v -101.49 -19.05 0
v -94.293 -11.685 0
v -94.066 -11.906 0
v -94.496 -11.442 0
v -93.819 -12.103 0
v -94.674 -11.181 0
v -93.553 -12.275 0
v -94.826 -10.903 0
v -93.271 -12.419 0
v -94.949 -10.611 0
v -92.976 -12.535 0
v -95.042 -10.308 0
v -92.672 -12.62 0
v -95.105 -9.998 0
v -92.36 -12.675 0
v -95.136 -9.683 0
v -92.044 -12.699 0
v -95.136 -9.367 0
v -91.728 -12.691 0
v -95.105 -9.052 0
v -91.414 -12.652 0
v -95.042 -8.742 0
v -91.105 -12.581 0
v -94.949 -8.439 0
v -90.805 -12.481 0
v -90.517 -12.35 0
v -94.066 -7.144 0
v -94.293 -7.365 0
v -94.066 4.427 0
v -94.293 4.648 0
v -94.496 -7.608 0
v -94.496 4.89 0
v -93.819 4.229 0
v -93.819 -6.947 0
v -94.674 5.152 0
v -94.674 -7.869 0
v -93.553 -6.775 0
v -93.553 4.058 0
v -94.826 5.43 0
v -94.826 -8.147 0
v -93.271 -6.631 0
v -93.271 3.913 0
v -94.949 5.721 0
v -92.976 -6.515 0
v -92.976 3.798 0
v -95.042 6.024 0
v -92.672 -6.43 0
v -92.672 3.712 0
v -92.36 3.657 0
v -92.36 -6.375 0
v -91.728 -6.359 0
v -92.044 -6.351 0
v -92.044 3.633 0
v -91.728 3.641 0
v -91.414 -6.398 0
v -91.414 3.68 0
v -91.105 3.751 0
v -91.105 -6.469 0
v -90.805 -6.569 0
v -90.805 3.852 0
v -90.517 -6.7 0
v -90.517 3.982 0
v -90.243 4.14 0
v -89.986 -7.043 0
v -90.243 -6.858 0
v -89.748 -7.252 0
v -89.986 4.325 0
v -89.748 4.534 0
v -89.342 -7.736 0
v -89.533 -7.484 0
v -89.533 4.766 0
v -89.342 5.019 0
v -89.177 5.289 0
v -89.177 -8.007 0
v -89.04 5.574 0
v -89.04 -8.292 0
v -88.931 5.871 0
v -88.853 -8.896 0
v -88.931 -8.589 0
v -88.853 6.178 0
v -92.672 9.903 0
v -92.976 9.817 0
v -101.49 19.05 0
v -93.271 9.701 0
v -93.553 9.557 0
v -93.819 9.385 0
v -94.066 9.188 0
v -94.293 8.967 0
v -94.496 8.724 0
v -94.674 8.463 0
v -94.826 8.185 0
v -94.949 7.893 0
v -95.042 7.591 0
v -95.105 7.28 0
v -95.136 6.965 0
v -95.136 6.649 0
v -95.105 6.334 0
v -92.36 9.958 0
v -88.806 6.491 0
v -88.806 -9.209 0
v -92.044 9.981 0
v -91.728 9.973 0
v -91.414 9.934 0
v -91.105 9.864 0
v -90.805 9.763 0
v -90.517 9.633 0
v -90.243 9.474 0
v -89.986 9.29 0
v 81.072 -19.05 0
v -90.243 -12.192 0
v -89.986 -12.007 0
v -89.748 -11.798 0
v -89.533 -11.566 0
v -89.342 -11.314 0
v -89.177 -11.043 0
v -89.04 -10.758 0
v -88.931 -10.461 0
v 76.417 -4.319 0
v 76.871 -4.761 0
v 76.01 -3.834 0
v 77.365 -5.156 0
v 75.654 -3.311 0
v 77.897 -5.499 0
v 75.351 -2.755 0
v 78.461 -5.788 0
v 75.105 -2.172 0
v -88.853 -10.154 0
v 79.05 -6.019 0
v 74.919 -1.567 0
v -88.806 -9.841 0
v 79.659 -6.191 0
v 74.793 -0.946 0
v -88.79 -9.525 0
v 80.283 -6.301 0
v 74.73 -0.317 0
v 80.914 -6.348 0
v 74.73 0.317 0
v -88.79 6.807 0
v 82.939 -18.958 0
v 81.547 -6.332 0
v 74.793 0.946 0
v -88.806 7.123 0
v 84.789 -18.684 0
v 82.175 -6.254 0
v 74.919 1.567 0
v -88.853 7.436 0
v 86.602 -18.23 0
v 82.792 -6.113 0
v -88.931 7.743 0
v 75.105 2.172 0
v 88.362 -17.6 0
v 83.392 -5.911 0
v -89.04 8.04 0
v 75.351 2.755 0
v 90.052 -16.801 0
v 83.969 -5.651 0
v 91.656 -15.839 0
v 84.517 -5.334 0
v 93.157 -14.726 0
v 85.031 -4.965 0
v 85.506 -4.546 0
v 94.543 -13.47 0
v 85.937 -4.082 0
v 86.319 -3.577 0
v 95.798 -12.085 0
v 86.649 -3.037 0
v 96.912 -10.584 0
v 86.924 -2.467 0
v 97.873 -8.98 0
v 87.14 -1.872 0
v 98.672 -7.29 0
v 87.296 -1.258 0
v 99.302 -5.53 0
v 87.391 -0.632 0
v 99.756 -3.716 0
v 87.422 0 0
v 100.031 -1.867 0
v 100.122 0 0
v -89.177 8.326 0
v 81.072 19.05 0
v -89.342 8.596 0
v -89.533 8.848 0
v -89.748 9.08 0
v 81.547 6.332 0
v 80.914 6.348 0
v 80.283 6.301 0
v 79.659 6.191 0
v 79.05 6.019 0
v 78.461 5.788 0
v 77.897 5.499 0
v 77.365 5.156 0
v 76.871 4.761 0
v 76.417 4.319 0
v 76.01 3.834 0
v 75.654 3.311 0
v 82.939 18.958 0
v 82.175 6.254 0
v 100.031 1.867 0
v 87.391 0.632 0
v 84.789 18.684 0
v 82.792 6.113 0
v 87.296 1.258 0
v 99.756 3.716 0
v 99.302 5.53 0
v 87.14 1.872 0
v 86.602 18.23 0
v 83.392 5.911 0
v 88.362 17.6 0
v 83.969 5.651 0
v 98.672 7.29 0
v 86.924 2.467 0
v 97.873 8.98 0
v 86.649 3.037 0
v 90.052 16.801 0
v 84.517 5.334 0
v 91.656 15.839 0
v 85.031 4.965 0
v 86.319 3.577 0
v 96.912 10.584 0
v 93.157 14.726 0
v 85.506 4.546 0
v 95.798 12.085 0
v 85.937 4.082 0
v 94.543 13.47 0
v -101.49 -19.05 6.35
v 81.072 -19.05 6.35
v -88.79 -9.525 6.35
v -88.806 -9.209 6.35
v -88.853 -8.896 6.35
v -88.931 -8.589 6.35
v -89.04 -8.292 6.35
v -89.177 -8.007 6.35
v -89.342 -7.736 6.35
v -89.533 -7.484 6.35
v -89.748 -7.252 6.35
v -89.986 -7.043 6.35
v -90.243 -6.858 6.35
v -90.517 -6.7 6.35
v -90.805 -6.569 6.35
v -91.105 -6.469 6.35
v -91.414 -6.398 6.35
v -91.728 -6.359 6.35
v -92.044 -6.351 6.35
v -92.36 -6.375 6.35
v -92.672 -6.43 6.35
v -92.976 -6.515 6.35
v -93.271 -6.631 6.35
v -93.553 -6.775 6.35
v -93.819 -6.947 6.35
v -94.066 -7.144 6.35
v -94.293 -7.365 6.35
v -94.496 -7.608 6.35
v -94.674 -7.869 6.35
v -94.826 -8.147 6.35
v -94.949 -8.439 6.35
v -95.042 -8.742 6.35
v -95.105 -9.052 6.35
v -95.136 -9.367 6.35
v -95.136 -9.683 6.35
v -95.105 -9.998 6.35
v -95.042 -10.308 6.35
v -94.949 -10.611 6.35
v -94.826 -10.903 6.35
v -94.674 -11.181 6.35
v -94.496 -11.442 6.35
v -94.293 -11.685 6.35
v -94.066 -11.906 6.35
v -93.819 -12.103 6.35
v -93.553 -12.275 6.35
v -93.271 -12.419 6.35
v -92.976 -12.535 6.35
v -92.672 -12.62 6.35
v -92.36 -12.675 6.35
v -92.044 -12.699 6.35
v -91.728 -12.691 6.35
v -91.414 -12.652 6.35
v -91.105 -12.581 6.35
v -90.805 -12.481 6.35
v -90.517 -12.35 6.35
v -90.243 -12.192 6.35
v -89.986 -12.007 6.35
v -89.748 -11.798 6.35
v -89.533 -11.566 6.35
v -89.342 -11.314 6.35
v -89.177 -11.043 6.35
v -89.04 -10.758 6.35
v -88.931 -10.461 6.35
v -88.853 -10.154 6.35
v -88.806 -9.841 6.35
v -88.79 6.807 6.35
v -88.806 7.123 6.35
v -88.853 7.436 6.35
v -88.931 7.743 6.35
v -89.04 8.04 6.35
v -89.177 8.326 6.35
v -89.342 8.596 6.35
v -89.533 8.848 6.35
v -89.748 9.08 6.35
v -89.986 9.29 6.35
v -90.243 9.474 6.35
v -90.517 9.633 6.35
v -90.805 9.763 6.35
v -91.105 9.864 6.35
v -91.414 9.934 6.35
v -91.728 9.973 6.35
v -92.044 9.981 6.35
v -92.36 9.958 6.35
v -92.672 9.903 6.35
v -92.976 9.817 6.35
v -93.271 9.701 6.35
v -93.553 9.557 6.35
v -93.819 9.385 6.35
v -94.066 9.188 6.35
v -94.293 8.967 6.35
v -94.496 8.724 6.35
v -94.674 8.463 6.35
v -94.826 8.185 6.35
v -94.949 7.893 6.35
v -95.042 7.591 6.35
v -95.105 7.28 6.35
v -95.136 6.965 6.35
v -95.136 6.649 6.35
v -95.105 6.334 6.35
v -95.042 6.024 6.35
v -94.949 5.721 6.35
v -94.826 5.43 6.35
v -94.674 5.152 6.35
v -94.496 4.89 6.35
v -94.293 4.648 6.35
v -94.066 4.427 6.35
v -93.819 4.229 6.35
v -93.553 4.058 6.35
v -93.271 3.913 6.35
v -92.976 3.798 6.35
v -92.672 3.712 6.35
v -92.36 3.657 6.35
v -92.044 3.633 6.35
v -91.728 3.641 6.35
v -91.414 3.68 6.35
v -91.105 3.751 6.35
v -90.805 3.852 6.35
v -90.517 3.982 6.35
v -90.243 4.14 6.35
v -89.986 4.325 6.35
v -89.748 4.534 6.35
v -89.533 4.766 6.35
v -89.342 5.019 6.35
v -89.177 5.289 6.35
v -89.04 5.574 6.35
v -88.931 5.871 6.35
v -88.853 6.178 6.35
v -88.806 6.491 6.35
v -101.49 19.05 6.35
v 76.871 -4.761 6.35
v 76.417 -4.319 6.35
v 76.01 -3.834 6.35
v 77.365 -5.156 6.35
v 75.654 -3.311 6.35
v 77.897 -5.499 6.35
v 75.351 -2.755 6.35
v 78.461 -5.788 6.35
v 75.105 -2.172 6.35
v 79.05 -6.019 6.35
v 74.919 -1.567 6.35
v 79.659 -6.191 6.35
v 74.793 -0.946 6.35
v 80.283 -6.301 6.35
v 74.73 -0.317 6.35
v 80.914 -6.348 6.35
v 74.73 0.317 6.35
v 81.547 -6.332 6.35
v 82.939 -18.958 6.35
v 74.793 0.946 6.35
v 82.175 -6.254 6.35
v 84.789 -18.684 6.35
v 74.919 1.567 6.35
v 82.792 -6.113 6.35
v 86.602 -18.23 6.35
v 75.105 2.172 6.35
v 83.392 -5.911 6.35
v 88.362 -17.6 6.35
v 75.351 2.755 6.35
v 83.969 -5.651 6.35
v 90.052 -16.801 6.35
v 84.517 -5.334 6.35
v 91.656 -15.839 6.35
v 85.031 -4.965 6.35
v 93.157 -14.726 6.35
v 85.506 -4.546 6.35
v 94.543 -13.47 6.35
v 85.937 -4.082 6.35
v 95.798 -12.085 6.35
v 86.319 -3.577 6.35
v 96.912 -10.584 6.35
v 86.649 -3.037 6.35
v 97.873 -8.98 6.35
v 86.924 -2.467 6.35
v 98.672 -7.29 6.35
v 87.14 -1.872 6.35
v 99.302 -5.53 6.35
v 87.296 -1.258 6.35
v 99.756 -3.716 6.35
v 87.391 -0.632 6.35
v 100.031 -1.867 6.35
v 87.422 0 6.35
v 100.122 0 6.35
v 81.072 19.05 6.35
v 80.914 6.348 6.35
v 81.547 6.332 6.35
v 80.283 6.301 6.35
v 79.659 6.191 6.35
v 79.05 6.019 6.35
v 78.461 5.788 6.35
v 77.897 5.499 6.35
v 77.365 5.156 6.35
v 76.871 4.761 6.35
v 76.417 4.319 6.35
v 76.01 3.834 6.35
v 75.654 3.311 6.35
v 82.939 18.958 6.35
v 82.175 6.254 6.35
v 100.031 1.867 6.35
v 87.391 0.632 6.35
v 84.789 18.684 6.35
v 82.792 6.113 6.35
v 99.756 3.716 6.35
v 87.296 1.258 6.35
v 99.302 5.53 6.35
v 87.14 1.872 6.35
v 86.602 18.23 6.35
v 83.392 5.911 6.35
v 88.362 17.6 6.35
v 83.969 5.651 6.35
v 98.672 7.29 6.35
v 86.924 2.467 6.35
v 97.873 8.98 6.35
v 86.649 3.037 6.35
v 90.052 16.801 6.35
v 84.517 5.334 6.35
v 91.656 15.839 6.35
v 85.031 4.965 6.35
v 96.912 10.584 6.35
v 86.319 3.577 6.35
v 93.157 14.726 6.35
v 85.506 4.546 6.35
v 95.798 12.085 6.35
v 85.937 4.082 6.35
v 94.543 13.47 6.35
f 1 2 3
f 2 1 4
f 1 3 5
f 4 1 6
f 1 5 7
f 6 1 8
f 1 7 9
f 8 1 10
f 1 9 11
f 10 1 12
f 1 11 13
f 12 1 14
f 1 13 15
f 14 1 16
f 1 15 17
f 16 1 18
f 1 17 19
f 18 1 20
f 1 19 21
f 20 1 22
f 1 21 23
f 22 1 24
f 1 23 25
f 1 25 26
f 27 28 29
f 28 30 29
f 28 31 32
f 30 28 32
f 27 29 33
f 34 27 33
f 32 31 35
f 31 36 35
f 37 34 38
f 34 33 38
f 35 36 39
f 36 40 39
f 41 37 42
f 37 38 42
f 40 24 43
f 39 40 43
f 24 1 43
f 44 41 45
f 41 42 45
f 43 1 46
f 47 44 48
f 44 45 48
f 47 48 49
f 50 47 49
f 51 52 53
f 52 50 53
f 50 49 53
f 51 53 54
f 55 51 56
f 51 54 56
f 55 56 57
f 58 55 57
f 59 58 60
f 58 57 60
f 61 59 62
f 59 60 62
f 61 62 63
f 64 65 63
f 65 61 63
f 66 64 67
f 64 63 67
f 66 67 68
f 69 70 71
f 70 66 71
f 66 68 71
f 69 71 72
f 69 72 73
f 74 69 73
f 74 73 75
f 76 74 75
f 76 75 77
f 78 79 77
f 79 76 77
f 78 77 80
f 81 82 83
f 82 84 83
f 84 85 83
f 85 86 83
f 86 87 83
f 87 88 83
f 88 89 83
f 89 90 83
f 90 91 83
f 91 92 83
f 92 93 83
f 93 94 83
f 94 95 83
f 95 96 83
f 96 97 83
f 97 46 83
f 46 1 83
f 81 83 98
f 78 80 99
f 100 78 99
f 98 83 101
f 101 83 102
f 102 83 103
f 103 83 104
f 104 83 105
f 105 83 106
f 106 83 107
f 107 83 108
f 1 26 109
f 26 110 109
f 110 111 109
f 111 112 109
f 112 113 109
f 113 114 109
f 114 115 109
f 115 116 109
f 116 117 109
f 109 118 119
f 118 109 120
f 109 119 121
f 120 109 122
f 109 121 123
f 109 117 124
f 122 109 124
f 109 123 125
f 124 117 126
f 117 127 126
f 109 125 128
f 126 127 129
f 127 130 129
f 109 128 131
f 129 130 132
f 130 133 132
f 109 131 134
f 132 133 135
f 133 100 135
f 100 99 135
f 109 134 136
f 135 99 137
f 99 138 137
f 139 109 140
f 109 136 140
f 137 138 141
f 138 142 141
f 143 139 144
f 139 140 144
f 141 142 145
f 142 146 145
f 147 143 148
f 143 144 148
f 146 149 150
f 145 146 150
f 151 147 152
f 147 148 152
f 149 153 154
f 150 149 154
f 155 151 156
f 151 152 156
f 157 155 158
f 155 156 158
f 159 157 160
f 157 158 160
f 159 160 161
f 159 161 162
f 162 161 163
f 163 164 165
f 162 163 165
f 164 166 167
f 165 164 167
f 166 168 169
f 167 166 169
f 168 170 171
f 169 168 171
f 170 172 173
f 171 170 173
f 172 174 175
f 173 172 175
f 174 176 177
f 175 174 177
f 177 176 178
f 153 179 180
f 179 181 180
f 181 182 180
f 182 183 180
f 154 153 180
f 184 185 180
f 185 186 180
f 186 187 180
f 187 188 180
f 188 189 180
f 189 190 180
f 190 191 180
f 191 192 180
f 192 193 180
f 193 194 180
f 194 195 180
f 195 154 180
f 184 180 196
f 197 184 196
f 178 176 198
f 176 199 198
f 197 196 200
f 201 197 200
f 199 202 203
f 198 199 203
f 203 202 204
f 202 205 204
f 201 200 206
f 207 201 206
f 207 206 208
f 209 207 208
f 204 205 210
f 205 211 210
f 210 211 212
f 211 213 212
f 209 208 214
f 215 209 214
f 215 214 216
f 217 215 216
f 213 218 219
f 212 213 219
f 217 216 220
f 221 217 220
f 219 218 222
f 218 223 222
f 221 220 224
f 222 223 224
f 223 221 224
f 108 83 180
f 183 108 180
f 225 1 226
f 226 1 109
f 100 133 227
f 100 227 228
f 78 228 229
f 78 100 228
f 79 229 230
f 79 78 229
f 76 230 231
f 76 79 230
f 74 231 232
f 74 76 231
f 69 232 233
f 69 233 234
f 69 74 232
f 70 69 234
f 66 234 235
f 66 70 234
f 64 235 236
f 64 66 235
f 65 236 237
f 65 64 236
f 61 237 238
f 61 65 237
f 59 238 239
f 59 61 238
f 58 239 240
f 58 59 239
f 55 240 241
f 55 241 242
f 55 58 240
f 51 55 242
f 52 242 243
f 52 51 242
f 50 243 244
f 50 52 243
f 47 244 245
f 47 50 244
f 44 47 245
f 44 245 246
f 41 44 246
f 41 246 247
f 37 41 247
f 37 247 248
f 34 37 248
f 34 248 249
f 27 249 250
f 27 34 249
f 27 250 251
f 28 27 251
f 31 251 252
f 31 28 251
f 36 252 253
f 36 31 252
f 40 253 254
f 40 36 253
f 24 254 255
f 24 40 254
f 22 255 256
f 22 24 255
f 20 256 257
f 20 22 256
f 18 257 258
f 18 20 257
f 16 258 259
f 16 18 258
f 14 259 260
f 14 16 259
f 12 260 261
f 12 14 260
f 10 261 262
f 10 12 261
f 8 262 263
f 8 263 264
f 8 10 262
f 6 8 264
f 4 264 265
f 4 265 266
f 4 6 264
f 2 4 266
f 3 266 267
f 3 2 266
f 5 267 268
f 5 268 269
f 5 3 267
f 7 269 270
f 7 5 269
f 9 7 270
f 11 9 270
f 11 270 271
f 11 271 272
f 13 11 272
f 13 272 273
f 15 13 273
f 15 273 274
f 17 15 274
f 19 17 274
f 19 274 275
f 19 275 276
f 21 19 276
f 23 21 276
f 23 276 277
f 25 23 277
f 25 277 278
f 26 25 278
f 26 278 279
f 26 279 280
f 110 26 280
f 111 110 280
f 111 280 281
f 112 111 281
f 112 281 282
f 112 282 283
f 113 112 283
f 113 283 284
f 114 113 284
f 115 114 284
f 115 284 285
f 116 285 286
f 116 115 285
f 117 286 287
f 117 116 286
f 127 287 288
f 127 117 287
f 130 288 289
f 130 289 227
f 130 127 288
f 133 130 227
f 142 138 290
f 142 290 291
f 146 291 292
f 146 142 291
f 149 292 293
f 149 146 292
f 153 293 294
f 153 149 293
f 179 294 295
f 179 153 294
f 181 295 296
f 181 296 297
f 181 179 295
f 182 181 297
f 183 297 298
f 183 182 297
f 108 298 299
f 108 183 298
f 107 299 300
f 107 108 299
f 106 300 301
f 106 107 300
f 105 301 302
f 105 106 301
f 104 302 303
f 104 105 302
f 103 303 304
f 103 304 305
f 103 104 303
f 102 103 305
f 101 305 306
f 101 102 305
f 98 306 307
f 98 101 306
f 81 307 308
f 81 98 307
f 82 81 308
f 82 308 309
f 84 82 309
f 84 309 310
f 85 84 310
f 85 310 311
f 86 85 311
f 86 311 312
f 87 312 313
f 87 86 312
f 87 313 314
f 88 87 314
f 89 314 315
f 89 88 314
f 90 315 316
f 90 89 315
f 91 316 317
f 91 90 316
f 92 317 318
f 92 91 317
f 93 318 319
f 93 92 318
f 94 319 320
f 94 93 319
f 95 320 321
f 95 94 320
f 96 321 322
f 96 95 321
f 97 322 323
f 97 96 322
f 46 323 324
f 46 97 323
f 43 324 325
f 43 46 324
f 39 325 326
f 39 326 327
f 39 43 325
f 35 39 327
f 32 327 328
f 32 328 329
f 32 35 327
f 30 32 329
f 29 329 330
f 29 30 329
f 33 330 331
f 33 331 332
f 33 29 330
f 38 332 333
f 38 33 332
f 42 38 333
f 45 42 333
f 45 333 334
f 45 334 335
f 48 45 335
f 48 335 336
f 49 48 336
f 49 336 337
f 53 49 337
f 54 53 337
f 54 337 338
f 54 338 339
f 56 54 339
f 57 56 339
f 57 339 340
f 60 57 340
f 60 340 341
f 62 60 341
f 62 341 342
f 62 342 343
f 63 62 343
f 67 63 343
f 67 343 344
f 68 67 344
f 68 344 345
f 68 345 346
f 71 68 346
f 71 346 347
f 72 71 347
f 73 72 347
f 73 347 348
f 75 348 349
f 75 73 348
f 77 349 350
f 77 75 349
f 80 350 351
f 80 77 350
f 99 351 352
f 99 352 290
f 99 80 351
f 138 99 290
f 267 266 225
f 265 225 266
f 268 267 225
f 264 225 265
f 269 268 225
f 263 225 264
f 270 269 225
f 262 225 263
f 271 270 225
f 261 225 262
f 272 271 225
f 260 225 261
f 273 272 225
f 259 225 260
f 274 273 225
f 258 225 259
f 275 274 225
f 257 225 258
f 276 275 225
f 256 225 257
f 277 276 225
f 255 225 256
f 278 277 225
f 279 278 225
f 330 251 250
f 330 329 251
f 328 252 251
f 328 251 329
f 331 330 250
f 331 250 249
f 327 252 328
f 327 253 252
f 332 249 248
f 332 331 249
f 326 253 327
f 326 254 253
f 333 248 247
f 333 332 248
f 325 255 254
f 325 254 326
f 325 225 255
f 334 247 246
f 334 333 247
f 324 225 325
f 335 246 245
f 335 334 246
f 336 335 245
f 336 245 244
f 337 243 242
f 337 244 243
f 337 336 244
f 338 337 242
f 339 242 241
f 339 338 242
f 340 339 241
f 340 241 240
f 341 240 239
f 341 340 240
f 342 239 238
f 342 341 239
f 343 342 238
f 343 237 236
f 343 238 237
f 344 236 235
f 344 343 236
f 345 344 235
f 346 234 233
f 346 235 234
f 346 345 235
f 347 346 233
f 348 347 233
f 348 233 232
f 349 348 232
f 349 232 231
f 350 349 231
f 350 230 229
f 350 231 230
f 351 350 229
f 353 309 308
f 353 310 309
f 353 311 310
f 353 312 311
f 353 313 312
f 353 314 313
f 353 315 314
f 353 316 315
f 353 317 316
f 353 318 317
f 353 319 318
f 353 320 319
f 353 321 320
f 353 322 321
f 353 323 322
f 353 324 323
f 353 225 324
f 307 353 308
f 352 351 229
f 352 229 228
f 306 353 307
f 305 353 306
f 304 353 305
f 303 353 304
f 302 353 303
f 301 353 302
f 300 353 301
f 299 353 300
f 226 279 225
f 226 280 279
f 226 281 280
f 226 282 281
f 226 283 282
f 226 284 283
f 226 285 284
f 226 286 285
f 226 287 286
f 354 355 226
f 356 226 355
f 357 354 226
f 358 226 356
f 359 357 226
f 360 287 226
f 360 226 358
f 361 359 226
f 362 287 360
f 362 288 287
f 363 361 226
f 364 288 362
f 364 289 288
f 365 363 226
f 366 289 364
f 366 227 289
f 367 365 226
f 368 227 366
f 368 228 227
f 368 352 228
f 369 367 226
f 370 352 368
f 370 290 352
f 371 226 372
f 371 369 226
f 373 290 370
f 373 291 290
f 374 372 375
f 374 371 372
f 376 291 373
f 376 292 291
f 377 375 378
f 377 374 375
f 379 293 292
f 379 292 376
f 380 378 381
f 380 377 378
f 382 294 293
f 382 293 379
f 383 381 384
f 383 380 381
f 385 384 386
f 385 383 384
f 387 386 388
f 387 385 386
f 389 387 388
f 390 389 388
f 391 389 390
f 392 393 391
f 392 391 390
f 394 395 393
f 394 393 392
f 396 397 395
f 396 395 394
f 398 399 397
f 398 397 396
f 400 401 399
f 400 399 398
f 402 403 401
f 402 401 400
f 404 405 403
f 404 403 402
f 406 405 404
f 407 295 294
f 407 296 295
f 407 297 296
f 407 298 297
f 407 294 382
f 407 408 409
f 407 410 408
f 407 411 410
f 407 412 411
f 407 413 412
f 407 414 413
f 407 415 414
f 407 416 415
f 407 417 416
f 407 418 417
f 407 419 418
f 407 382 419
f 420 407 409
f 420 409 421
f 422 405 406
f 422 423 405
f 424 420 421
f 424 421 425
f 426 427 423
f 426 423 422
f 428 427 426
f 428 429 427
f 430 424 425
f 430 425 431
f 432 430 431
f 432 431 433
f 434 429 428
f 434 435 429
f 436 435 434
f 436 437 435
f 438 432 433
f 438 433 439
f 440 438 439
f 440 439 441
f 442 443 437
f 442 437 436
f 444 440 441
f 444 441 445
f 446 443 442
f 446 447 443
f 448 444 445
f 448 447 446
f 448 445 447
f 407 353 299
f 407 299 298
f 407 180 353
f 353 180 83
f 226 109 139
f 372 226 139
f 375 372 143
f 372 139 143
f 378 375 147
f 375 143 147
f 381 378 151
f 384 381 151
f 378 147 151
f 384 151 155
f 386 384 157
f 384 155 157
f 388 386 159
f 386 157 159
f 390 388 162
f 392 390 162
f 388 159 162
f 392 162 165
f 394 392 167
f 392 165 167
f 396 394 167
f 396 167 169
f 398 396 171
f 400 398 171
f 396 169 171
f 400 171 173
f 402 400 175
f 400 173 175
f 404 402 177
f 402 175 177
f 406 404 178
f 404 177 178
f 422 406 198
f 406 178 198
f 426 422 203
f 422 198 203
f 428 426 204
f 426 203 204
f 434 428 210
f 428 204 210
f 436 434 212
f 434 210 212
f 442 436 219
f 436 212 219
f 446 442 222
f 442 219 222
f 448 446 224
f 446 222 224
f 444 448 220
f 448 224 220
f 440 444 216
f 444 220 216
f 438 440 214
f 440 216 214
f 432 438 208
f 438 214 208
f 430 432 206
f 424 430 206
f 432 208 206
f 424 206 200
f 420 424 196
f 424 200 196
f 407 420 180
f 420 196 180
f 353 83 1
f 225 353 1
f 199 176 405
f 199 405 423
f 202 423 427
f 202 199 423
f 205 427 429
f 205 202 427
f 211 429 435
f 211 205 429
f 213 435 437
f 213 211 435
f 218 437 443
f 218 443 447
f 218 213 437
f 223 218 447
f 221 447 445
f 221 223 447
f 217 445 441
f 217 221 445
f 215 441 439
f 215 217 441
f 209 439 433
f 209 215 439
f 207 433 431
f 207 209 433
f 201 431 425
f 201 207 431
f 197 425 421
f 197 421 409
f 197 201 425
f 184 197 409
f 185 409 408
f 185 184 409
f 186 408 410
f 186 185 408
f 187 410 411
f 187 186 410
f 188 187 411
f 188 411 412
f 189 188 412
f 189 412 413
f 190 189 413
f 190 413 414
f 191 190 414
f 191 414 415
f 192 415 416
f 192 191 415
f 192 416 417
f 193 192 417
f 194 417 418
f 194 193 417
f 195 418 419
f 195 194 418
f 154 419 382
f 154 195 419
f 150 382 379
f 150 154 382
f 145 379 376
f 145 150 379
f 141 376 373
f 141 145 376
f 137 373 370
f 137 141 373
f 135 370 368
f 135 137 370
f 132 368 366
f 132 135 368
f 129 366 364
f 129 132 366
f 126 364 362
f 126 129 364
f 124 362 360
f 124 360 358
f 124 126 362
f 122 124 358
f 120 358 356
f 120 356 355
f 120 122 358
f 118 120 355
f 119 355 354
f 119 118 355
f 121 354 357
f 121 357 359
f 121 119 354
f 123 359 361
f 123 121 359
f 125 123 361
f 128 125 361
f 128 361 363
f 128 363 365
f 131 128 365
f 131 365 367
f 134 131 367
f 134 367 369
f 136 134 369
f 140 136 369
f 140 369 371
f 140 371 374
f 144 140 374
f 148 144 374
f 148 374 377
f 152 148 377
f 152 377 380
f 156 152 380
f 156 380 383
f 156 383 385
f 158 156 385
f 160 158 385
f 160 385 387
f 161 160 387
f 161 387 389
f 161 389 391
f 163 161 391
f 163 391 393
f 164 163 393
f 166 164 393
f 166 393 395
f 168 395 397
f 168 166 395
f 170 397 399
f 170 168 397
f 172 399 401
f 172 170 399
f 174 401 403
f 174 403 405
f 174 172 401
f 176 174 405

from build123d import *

# Parameters (mm, degrees)
F0_R     = 3.175
F0_R_2   = 6.35
F1_DEPTH = 6.35


with BuildPart() as f1:
    # F0 (on Top) → F1 (new body)
    with BuildSketch(Plane.XY):
        with BuildLine():
            Line((-101.490255, -19.05), (81.072245, -19.05))
            ThreePointArc((81.072245, -19.05), (100.122245, 0), (81.072245, 19.05))
            Line((81.072245, 19.05), (-101.490255, 19.05))
            Line((-101.490255, 19.05), (-101.490255, -19.05))
        make_face()
        with Locations((-91.965255, -9.525)):
            Circle(F0_R, mode=Mode.SUBTRACT)
        with Locations((-91.965255, 6.8072)):
            Circle(F0_R, mode=Mode.SUBTRACT)
        with Locations((81.072245, 0)):
            Circle(F0_R_2, mode=Mode.SUBTRACT)
    extrude(amount=F1_DEPTH)


solid = f1.part
